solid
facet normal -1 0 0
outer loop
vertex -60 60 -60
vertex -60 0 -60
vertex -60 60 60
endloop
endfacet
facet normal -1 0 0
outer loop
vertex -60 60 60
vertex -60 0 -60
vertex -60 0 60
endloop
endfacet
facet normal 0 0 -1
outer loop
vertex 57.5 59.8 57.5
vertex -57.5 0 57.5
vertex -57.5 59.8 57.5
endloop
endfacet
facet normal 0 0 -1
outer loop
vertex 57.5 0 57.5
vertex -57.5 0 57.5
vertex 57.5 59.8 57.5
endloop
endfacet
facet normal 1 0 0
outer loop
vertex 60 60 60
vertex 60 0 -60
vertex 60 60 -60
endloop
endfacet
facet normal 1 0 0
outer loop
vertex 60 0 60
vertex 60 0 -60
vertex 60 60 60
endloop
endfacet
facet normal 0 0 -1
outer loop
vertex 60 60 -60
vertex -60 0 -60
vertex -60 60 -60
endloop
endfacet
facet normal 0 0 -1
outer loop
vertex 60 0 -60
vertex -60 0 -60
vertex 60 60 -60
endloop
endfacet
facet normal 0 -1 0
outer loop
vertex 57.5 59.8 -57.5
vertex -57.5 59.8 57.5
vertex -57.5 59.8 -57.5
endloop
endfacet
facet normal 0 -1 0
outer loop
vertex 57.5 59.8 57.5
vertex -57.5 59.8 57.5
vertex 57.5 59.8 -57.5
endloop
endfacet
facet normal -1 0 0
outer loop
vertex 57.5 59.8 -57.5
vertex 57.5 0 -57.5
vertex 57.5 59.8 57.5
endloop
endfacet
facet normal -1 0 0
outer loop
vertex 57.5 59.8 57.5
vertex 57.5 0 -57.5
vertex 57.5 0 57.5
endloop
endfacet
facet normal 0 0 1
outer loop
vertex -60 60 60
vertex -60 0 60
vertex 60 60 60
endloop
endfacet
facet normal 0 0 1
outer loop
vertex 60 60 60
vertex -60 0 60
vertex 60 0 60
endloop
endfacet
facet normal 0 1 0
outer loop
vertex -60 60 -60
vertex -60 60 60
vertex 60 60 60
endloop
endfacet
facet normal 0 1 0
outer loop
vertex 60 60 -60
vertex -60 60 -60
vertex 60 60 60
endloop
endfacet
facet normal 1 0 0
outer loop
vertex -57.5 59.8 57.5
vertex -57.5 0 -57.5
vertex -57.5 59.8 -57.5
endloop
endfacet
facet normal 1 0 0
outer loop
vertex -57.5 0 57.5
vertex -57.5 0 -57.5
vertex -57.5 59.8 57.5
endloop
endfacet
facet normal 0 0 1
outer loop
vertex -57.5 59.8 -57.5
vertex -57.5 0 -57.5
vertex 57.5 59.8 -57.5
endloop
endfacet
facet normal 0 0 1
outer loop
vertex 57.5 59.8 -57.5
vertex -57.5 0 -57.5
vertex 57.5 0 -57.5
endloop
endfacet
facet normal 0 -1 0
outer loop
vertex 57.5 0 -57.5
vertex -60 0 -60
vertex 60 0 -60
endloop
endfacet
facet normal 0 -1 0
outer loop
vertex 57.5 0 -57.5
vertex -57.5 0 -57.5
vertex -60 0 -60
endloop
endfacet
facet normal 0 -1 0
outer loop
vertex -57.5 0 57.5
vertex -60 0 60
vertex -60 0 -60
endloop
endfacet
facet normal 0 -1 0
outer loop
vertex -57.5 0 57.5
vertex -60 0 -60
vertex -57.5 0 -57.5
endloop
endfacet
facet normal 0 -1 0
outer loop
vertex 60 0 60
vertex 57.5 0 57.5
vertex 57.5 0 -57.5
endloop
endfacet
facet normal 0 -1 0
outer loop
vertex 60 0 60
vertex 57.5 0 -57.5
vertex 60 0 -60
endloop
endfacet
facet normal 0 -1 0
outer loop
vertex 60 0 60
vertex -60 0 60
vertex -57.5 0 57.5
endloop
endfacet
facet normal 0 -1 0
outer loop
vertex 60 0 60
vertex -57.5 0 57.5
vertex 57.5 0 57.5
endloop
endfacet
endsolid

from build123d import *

# Parameters (mm, degrees)
F0_W     = 120
F0_H     = 120
F1_DEPTH = 60
F2_W     = 115
F2_H     = 115
F3_DEPTH = 59.8


# Not quite as in the source:
# - the program builds the solid bodies; features that only make, move or delete a surface that nothing else refers to are left out


with BuildPart() as f1:
    # F0 (on Front) → F1 (new body)
    with BuildSketch(Plane.XZ):
        Rectangle(F0_W, F0_H)
    extrude(amount=-F1_DEPTH)

    # F2 (on Front) → F3 (cut)
    with BuildSketch(Plane.XZ):
        Rectangle(F2_W, F2_H)
    extrude(amount=-F3_DEPTH, mode=Mode.SUBTRACT)


solid = f1.part
